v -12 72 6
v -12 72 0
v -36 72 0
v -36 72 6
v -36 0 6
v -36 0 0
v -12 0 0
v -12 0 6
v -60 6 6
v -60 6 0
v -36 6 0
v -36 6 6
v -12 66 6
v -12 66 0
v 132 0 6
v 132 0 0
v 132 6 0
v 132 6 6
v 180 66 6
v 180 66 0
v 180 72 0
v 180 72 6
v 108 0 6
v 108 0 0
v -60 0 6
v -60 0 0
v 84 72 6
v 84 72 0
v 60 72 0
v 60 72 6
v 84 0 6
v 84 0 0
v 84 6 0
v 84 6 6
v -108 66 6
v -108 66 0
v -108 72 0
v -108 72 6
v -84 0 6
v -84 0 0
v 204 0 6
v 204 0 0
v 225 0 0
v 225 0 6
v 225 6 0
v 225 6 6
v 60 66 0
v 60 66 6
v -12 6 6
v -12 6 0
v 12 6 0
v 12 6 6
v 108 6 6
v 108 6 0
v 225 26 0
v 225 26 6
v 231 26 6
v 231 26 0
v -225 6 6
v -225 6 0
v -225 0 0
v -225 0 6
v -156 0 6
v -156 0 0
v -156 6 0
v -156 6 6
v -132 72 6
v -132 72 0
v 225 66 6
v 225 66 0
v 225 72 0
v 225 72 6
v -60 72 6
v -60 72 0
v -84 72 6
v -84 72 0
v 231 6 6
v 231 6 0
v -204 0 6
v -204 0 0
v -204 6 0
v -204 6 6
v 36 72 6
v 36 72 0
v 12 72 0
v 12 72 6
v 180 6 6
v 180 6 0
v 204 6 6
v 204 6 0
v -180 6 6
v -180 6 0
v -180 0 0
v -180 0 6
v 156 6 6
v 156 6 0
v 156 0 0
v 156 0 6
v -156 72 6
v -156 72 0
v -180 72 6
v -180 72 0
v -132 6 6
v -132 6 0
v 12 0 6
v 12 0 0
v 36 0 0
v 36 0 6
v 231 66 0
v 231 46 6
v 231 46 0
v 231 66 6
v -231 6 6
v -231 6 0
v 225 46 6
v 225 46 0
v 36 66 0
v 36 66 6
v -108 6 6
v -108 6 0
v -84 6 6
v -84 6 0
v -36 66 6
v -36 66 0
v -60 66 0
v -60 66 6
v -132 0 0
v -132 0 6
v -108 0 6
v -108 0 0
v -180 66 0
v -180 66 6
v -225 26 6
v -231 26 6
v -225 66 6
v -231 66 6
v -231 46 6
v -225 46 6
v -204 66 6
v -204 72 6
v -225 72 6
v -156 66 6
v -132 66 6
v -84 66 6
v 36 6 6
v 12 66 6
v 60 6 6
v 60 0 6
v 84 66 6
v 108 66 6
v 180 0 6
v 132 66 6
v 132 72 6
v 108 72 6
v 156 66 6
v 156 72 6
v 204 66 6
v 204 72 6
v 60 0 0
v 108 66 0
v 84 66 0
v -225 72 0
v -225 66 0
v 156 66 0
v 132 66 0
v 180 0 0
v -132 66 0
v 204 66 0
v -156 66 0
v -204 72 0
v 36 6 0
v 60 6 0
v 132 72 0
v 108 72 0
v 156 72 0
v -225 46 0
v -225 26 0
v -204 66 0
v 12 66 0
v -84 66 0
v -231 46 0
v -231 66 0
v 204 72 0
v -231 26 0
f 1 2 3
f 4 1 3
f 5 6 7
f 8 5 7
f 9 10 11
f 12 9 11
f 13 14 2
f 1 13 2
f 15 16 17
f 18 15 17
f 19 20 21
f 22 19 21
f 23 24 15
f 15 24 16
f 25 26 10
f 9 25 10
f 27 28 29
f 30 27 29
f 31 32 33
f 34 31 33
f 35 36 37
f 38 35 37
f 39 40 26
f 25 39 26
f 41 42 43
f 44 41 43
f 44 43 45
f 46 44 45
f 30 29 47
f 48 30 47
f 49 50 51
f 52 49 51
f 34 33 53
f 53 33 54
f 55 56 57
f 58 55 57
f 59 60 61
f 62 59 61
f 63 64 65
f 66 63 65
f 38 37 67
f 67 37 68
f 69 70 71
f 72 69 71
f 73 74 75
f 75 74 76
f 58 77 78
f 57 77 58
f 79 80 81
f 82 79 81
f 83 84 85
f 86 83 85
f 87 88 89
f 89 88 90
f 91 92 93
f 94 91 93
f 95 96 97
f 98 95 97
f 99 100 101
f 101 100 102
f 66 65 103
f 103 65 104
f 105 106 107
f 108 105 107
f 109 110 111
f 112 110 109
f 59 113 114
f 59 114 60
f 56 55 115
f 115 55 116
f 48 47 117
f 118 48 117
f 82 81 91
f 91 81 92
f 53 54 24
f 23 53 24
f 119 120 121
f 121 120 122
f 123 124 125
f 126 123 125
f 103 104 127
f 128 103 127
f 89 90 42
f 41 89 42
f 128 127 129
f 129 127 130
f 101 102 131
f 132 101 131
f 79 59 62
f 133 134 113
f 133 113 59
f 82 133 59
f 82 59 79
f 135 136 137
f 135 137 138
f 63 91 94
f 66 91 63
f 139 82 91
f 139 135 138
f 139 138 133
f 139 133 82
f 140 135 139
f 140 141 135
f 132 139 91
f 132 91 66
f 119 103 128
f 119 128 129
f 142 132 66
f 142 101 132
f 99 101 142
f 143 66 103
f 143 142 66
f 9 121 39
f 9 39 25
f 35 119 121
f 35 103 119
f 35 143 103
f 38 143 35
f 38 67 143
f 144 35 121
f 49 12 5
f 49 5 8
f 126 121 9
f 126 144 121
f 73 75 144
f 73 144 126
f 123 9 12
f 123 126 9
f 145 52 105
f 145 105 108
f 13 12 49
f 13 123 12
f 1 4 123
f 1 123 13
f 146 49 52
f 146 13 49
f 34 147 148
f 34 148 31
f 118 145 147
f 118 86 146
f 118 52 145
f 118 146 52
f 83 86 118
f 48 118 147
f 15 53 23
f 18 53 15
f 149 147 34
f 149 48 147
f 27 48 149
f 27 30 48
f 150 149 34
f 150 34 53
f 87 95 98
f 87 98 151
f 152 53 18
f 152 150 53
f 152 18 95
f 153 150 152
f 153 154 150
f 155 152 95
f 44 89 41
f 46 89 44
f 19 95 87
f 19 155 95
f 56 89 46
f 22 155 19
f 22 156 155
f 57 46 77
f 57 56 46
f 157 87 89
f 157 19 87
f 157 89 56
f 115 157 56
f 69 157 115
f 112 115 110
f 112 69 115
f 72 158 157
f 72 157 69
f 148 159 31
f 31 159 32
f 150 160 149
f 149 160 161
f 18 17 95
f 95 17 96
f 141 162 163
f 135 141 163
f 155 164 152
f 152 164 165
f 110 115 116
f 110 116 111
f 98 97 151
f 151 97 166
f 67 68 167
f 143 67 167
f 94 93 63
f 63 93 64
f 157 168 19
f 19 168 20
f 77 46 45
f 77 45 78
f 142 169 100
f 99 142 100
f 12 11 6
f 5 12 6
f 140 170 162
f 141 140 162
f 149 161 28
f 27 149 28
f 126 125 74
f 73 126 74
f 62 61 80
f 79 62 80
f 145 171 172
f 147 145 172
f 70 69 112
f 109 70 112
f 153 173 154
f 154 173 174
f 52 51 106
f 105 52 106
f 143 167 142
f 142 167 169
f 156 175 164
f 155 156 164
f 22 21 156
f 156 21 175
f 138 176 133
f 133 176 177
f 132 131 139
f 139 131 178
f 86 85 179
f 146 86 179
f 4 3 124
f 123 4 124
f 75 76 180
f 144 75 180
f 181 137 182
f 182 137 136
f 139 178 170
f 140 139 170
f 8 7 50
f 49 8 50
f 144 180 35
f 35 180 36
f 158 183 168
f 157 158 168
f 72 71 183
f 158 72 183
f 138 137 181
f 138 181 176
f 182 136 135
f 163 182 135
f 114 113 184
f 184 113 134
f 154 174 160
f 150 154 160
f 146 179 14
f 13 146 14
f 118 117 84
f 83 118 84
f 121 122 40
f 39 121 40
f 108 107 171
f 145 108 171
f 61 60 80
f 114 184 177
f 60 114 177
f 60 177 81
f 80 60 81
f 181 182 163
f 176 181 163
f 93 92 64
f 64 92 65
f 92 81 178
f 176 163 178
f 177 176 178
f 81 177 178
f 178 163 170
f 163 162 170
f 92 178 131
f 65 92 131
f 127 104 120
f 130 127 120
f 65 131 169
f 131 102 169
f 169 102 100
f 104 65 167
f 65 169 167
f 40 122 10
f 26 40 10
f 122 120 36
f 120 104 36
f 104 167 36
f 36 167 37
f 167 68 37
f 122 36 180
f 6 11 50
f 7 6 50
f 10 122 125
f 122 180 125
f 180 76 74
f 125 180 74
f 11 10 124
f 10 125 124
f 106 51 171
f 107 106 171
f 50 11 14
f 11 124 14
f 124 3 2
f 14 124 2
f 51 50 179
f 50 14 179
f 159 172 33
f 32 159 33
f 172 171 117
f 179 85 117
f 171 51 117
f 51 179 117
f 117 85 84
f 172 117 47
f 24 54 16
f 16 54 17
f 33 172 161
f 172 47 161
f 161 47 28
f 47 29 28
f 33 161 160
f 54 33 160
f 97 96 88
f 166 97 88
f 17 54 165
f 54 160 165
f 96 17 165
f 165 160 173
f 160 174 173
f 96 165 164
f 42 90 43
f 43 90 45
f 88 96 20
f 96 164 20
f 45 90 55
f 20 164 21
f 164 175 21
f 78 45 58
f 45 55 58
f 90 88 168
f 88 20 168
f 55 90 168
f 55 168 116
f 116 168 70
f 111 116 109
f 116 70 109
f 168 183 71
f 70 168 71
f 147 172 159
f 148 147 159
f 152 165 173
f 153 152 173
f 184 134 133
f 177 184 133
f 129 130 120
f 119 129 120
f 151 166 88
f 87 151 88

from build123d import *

# Parameters (mm, degrees)
BOSS_EXTRUDE1_DEPTH = 6
SKETCH3_W           = 6
SKETCH3_H           = 20
BOSS_EXTRUDE2_DEPTH = 6


with BuildPart() as part:
    # Sketch1 → Boss-Extrude1 (new body)
    with BuildSketch(Plane.XY):
        Polygon((-225, 0), (-204, 0), (-204, 6), (-180, 6), (-180, 0), (-156, 0), (-156, 6), (-132, 6), (-132, 0), (-108, 0), (-108, 6), (-84, 6), (-84, 0), (-60, 0), (-60, 6), (-36, 6), (-36, 0), (-12, 0), (-12, 6), (12, 6), (12, 0), (36, 0), (36, 6), (60, 6), (60, 0), (84, 0), (84, 6), (108, 6), (108, 0), (132, 0), (132, 6), (156, 6), (156, 0), (180, 0), (180, 6), (204, 6), (204, 0), (225, 0), (225, 72), (204, 72), (204, 66), (180, 66), (180, 72), (156, 72), (156, 66), (132, 66), (132, 72), (108, 72), (108, 66), (84, 66), (84, 72), (60, 72), (60, 66), (36, 66), (36, 72), (12, 72), (12, 66), (-12, 66), (-12, 72), (-36, 72), (-36, 66), (-60, 66), (-60, 72), (-84, 72), (-84, 66), (-108, 66), (-108, 72), (-132, 72), (-132, 66), (-156, 66), (-156, 72), (-180, 72), (-180, 66), (-204, 66), (-204, 72), (-225, 72), align=None)
    extrude(amount=BOSS_EXTRUDE1_DEPTH)

    # Sketch3 → Boss-Extrude2 (add)
    with BuildSketch(Plane.XY.offset(6)):
        with Locations((-228, 16)):
            Rectangle(SKETCH3_W, SKETCH3_H)
        with Locations((-228, 56)):
            Rectangle(SKETCH3_W, SKETCH3_H)
        with Locations((228, 16)):
            Rectangle(SKETCH3_W, SKETCH3_H)
        with Locations((228, 56)):
            Rectangle(SKETCH3_W, SKETCH3_H)
    extrude(amount=-BOSS_EXTRUDE2_DEPTH)


solid = part.part
